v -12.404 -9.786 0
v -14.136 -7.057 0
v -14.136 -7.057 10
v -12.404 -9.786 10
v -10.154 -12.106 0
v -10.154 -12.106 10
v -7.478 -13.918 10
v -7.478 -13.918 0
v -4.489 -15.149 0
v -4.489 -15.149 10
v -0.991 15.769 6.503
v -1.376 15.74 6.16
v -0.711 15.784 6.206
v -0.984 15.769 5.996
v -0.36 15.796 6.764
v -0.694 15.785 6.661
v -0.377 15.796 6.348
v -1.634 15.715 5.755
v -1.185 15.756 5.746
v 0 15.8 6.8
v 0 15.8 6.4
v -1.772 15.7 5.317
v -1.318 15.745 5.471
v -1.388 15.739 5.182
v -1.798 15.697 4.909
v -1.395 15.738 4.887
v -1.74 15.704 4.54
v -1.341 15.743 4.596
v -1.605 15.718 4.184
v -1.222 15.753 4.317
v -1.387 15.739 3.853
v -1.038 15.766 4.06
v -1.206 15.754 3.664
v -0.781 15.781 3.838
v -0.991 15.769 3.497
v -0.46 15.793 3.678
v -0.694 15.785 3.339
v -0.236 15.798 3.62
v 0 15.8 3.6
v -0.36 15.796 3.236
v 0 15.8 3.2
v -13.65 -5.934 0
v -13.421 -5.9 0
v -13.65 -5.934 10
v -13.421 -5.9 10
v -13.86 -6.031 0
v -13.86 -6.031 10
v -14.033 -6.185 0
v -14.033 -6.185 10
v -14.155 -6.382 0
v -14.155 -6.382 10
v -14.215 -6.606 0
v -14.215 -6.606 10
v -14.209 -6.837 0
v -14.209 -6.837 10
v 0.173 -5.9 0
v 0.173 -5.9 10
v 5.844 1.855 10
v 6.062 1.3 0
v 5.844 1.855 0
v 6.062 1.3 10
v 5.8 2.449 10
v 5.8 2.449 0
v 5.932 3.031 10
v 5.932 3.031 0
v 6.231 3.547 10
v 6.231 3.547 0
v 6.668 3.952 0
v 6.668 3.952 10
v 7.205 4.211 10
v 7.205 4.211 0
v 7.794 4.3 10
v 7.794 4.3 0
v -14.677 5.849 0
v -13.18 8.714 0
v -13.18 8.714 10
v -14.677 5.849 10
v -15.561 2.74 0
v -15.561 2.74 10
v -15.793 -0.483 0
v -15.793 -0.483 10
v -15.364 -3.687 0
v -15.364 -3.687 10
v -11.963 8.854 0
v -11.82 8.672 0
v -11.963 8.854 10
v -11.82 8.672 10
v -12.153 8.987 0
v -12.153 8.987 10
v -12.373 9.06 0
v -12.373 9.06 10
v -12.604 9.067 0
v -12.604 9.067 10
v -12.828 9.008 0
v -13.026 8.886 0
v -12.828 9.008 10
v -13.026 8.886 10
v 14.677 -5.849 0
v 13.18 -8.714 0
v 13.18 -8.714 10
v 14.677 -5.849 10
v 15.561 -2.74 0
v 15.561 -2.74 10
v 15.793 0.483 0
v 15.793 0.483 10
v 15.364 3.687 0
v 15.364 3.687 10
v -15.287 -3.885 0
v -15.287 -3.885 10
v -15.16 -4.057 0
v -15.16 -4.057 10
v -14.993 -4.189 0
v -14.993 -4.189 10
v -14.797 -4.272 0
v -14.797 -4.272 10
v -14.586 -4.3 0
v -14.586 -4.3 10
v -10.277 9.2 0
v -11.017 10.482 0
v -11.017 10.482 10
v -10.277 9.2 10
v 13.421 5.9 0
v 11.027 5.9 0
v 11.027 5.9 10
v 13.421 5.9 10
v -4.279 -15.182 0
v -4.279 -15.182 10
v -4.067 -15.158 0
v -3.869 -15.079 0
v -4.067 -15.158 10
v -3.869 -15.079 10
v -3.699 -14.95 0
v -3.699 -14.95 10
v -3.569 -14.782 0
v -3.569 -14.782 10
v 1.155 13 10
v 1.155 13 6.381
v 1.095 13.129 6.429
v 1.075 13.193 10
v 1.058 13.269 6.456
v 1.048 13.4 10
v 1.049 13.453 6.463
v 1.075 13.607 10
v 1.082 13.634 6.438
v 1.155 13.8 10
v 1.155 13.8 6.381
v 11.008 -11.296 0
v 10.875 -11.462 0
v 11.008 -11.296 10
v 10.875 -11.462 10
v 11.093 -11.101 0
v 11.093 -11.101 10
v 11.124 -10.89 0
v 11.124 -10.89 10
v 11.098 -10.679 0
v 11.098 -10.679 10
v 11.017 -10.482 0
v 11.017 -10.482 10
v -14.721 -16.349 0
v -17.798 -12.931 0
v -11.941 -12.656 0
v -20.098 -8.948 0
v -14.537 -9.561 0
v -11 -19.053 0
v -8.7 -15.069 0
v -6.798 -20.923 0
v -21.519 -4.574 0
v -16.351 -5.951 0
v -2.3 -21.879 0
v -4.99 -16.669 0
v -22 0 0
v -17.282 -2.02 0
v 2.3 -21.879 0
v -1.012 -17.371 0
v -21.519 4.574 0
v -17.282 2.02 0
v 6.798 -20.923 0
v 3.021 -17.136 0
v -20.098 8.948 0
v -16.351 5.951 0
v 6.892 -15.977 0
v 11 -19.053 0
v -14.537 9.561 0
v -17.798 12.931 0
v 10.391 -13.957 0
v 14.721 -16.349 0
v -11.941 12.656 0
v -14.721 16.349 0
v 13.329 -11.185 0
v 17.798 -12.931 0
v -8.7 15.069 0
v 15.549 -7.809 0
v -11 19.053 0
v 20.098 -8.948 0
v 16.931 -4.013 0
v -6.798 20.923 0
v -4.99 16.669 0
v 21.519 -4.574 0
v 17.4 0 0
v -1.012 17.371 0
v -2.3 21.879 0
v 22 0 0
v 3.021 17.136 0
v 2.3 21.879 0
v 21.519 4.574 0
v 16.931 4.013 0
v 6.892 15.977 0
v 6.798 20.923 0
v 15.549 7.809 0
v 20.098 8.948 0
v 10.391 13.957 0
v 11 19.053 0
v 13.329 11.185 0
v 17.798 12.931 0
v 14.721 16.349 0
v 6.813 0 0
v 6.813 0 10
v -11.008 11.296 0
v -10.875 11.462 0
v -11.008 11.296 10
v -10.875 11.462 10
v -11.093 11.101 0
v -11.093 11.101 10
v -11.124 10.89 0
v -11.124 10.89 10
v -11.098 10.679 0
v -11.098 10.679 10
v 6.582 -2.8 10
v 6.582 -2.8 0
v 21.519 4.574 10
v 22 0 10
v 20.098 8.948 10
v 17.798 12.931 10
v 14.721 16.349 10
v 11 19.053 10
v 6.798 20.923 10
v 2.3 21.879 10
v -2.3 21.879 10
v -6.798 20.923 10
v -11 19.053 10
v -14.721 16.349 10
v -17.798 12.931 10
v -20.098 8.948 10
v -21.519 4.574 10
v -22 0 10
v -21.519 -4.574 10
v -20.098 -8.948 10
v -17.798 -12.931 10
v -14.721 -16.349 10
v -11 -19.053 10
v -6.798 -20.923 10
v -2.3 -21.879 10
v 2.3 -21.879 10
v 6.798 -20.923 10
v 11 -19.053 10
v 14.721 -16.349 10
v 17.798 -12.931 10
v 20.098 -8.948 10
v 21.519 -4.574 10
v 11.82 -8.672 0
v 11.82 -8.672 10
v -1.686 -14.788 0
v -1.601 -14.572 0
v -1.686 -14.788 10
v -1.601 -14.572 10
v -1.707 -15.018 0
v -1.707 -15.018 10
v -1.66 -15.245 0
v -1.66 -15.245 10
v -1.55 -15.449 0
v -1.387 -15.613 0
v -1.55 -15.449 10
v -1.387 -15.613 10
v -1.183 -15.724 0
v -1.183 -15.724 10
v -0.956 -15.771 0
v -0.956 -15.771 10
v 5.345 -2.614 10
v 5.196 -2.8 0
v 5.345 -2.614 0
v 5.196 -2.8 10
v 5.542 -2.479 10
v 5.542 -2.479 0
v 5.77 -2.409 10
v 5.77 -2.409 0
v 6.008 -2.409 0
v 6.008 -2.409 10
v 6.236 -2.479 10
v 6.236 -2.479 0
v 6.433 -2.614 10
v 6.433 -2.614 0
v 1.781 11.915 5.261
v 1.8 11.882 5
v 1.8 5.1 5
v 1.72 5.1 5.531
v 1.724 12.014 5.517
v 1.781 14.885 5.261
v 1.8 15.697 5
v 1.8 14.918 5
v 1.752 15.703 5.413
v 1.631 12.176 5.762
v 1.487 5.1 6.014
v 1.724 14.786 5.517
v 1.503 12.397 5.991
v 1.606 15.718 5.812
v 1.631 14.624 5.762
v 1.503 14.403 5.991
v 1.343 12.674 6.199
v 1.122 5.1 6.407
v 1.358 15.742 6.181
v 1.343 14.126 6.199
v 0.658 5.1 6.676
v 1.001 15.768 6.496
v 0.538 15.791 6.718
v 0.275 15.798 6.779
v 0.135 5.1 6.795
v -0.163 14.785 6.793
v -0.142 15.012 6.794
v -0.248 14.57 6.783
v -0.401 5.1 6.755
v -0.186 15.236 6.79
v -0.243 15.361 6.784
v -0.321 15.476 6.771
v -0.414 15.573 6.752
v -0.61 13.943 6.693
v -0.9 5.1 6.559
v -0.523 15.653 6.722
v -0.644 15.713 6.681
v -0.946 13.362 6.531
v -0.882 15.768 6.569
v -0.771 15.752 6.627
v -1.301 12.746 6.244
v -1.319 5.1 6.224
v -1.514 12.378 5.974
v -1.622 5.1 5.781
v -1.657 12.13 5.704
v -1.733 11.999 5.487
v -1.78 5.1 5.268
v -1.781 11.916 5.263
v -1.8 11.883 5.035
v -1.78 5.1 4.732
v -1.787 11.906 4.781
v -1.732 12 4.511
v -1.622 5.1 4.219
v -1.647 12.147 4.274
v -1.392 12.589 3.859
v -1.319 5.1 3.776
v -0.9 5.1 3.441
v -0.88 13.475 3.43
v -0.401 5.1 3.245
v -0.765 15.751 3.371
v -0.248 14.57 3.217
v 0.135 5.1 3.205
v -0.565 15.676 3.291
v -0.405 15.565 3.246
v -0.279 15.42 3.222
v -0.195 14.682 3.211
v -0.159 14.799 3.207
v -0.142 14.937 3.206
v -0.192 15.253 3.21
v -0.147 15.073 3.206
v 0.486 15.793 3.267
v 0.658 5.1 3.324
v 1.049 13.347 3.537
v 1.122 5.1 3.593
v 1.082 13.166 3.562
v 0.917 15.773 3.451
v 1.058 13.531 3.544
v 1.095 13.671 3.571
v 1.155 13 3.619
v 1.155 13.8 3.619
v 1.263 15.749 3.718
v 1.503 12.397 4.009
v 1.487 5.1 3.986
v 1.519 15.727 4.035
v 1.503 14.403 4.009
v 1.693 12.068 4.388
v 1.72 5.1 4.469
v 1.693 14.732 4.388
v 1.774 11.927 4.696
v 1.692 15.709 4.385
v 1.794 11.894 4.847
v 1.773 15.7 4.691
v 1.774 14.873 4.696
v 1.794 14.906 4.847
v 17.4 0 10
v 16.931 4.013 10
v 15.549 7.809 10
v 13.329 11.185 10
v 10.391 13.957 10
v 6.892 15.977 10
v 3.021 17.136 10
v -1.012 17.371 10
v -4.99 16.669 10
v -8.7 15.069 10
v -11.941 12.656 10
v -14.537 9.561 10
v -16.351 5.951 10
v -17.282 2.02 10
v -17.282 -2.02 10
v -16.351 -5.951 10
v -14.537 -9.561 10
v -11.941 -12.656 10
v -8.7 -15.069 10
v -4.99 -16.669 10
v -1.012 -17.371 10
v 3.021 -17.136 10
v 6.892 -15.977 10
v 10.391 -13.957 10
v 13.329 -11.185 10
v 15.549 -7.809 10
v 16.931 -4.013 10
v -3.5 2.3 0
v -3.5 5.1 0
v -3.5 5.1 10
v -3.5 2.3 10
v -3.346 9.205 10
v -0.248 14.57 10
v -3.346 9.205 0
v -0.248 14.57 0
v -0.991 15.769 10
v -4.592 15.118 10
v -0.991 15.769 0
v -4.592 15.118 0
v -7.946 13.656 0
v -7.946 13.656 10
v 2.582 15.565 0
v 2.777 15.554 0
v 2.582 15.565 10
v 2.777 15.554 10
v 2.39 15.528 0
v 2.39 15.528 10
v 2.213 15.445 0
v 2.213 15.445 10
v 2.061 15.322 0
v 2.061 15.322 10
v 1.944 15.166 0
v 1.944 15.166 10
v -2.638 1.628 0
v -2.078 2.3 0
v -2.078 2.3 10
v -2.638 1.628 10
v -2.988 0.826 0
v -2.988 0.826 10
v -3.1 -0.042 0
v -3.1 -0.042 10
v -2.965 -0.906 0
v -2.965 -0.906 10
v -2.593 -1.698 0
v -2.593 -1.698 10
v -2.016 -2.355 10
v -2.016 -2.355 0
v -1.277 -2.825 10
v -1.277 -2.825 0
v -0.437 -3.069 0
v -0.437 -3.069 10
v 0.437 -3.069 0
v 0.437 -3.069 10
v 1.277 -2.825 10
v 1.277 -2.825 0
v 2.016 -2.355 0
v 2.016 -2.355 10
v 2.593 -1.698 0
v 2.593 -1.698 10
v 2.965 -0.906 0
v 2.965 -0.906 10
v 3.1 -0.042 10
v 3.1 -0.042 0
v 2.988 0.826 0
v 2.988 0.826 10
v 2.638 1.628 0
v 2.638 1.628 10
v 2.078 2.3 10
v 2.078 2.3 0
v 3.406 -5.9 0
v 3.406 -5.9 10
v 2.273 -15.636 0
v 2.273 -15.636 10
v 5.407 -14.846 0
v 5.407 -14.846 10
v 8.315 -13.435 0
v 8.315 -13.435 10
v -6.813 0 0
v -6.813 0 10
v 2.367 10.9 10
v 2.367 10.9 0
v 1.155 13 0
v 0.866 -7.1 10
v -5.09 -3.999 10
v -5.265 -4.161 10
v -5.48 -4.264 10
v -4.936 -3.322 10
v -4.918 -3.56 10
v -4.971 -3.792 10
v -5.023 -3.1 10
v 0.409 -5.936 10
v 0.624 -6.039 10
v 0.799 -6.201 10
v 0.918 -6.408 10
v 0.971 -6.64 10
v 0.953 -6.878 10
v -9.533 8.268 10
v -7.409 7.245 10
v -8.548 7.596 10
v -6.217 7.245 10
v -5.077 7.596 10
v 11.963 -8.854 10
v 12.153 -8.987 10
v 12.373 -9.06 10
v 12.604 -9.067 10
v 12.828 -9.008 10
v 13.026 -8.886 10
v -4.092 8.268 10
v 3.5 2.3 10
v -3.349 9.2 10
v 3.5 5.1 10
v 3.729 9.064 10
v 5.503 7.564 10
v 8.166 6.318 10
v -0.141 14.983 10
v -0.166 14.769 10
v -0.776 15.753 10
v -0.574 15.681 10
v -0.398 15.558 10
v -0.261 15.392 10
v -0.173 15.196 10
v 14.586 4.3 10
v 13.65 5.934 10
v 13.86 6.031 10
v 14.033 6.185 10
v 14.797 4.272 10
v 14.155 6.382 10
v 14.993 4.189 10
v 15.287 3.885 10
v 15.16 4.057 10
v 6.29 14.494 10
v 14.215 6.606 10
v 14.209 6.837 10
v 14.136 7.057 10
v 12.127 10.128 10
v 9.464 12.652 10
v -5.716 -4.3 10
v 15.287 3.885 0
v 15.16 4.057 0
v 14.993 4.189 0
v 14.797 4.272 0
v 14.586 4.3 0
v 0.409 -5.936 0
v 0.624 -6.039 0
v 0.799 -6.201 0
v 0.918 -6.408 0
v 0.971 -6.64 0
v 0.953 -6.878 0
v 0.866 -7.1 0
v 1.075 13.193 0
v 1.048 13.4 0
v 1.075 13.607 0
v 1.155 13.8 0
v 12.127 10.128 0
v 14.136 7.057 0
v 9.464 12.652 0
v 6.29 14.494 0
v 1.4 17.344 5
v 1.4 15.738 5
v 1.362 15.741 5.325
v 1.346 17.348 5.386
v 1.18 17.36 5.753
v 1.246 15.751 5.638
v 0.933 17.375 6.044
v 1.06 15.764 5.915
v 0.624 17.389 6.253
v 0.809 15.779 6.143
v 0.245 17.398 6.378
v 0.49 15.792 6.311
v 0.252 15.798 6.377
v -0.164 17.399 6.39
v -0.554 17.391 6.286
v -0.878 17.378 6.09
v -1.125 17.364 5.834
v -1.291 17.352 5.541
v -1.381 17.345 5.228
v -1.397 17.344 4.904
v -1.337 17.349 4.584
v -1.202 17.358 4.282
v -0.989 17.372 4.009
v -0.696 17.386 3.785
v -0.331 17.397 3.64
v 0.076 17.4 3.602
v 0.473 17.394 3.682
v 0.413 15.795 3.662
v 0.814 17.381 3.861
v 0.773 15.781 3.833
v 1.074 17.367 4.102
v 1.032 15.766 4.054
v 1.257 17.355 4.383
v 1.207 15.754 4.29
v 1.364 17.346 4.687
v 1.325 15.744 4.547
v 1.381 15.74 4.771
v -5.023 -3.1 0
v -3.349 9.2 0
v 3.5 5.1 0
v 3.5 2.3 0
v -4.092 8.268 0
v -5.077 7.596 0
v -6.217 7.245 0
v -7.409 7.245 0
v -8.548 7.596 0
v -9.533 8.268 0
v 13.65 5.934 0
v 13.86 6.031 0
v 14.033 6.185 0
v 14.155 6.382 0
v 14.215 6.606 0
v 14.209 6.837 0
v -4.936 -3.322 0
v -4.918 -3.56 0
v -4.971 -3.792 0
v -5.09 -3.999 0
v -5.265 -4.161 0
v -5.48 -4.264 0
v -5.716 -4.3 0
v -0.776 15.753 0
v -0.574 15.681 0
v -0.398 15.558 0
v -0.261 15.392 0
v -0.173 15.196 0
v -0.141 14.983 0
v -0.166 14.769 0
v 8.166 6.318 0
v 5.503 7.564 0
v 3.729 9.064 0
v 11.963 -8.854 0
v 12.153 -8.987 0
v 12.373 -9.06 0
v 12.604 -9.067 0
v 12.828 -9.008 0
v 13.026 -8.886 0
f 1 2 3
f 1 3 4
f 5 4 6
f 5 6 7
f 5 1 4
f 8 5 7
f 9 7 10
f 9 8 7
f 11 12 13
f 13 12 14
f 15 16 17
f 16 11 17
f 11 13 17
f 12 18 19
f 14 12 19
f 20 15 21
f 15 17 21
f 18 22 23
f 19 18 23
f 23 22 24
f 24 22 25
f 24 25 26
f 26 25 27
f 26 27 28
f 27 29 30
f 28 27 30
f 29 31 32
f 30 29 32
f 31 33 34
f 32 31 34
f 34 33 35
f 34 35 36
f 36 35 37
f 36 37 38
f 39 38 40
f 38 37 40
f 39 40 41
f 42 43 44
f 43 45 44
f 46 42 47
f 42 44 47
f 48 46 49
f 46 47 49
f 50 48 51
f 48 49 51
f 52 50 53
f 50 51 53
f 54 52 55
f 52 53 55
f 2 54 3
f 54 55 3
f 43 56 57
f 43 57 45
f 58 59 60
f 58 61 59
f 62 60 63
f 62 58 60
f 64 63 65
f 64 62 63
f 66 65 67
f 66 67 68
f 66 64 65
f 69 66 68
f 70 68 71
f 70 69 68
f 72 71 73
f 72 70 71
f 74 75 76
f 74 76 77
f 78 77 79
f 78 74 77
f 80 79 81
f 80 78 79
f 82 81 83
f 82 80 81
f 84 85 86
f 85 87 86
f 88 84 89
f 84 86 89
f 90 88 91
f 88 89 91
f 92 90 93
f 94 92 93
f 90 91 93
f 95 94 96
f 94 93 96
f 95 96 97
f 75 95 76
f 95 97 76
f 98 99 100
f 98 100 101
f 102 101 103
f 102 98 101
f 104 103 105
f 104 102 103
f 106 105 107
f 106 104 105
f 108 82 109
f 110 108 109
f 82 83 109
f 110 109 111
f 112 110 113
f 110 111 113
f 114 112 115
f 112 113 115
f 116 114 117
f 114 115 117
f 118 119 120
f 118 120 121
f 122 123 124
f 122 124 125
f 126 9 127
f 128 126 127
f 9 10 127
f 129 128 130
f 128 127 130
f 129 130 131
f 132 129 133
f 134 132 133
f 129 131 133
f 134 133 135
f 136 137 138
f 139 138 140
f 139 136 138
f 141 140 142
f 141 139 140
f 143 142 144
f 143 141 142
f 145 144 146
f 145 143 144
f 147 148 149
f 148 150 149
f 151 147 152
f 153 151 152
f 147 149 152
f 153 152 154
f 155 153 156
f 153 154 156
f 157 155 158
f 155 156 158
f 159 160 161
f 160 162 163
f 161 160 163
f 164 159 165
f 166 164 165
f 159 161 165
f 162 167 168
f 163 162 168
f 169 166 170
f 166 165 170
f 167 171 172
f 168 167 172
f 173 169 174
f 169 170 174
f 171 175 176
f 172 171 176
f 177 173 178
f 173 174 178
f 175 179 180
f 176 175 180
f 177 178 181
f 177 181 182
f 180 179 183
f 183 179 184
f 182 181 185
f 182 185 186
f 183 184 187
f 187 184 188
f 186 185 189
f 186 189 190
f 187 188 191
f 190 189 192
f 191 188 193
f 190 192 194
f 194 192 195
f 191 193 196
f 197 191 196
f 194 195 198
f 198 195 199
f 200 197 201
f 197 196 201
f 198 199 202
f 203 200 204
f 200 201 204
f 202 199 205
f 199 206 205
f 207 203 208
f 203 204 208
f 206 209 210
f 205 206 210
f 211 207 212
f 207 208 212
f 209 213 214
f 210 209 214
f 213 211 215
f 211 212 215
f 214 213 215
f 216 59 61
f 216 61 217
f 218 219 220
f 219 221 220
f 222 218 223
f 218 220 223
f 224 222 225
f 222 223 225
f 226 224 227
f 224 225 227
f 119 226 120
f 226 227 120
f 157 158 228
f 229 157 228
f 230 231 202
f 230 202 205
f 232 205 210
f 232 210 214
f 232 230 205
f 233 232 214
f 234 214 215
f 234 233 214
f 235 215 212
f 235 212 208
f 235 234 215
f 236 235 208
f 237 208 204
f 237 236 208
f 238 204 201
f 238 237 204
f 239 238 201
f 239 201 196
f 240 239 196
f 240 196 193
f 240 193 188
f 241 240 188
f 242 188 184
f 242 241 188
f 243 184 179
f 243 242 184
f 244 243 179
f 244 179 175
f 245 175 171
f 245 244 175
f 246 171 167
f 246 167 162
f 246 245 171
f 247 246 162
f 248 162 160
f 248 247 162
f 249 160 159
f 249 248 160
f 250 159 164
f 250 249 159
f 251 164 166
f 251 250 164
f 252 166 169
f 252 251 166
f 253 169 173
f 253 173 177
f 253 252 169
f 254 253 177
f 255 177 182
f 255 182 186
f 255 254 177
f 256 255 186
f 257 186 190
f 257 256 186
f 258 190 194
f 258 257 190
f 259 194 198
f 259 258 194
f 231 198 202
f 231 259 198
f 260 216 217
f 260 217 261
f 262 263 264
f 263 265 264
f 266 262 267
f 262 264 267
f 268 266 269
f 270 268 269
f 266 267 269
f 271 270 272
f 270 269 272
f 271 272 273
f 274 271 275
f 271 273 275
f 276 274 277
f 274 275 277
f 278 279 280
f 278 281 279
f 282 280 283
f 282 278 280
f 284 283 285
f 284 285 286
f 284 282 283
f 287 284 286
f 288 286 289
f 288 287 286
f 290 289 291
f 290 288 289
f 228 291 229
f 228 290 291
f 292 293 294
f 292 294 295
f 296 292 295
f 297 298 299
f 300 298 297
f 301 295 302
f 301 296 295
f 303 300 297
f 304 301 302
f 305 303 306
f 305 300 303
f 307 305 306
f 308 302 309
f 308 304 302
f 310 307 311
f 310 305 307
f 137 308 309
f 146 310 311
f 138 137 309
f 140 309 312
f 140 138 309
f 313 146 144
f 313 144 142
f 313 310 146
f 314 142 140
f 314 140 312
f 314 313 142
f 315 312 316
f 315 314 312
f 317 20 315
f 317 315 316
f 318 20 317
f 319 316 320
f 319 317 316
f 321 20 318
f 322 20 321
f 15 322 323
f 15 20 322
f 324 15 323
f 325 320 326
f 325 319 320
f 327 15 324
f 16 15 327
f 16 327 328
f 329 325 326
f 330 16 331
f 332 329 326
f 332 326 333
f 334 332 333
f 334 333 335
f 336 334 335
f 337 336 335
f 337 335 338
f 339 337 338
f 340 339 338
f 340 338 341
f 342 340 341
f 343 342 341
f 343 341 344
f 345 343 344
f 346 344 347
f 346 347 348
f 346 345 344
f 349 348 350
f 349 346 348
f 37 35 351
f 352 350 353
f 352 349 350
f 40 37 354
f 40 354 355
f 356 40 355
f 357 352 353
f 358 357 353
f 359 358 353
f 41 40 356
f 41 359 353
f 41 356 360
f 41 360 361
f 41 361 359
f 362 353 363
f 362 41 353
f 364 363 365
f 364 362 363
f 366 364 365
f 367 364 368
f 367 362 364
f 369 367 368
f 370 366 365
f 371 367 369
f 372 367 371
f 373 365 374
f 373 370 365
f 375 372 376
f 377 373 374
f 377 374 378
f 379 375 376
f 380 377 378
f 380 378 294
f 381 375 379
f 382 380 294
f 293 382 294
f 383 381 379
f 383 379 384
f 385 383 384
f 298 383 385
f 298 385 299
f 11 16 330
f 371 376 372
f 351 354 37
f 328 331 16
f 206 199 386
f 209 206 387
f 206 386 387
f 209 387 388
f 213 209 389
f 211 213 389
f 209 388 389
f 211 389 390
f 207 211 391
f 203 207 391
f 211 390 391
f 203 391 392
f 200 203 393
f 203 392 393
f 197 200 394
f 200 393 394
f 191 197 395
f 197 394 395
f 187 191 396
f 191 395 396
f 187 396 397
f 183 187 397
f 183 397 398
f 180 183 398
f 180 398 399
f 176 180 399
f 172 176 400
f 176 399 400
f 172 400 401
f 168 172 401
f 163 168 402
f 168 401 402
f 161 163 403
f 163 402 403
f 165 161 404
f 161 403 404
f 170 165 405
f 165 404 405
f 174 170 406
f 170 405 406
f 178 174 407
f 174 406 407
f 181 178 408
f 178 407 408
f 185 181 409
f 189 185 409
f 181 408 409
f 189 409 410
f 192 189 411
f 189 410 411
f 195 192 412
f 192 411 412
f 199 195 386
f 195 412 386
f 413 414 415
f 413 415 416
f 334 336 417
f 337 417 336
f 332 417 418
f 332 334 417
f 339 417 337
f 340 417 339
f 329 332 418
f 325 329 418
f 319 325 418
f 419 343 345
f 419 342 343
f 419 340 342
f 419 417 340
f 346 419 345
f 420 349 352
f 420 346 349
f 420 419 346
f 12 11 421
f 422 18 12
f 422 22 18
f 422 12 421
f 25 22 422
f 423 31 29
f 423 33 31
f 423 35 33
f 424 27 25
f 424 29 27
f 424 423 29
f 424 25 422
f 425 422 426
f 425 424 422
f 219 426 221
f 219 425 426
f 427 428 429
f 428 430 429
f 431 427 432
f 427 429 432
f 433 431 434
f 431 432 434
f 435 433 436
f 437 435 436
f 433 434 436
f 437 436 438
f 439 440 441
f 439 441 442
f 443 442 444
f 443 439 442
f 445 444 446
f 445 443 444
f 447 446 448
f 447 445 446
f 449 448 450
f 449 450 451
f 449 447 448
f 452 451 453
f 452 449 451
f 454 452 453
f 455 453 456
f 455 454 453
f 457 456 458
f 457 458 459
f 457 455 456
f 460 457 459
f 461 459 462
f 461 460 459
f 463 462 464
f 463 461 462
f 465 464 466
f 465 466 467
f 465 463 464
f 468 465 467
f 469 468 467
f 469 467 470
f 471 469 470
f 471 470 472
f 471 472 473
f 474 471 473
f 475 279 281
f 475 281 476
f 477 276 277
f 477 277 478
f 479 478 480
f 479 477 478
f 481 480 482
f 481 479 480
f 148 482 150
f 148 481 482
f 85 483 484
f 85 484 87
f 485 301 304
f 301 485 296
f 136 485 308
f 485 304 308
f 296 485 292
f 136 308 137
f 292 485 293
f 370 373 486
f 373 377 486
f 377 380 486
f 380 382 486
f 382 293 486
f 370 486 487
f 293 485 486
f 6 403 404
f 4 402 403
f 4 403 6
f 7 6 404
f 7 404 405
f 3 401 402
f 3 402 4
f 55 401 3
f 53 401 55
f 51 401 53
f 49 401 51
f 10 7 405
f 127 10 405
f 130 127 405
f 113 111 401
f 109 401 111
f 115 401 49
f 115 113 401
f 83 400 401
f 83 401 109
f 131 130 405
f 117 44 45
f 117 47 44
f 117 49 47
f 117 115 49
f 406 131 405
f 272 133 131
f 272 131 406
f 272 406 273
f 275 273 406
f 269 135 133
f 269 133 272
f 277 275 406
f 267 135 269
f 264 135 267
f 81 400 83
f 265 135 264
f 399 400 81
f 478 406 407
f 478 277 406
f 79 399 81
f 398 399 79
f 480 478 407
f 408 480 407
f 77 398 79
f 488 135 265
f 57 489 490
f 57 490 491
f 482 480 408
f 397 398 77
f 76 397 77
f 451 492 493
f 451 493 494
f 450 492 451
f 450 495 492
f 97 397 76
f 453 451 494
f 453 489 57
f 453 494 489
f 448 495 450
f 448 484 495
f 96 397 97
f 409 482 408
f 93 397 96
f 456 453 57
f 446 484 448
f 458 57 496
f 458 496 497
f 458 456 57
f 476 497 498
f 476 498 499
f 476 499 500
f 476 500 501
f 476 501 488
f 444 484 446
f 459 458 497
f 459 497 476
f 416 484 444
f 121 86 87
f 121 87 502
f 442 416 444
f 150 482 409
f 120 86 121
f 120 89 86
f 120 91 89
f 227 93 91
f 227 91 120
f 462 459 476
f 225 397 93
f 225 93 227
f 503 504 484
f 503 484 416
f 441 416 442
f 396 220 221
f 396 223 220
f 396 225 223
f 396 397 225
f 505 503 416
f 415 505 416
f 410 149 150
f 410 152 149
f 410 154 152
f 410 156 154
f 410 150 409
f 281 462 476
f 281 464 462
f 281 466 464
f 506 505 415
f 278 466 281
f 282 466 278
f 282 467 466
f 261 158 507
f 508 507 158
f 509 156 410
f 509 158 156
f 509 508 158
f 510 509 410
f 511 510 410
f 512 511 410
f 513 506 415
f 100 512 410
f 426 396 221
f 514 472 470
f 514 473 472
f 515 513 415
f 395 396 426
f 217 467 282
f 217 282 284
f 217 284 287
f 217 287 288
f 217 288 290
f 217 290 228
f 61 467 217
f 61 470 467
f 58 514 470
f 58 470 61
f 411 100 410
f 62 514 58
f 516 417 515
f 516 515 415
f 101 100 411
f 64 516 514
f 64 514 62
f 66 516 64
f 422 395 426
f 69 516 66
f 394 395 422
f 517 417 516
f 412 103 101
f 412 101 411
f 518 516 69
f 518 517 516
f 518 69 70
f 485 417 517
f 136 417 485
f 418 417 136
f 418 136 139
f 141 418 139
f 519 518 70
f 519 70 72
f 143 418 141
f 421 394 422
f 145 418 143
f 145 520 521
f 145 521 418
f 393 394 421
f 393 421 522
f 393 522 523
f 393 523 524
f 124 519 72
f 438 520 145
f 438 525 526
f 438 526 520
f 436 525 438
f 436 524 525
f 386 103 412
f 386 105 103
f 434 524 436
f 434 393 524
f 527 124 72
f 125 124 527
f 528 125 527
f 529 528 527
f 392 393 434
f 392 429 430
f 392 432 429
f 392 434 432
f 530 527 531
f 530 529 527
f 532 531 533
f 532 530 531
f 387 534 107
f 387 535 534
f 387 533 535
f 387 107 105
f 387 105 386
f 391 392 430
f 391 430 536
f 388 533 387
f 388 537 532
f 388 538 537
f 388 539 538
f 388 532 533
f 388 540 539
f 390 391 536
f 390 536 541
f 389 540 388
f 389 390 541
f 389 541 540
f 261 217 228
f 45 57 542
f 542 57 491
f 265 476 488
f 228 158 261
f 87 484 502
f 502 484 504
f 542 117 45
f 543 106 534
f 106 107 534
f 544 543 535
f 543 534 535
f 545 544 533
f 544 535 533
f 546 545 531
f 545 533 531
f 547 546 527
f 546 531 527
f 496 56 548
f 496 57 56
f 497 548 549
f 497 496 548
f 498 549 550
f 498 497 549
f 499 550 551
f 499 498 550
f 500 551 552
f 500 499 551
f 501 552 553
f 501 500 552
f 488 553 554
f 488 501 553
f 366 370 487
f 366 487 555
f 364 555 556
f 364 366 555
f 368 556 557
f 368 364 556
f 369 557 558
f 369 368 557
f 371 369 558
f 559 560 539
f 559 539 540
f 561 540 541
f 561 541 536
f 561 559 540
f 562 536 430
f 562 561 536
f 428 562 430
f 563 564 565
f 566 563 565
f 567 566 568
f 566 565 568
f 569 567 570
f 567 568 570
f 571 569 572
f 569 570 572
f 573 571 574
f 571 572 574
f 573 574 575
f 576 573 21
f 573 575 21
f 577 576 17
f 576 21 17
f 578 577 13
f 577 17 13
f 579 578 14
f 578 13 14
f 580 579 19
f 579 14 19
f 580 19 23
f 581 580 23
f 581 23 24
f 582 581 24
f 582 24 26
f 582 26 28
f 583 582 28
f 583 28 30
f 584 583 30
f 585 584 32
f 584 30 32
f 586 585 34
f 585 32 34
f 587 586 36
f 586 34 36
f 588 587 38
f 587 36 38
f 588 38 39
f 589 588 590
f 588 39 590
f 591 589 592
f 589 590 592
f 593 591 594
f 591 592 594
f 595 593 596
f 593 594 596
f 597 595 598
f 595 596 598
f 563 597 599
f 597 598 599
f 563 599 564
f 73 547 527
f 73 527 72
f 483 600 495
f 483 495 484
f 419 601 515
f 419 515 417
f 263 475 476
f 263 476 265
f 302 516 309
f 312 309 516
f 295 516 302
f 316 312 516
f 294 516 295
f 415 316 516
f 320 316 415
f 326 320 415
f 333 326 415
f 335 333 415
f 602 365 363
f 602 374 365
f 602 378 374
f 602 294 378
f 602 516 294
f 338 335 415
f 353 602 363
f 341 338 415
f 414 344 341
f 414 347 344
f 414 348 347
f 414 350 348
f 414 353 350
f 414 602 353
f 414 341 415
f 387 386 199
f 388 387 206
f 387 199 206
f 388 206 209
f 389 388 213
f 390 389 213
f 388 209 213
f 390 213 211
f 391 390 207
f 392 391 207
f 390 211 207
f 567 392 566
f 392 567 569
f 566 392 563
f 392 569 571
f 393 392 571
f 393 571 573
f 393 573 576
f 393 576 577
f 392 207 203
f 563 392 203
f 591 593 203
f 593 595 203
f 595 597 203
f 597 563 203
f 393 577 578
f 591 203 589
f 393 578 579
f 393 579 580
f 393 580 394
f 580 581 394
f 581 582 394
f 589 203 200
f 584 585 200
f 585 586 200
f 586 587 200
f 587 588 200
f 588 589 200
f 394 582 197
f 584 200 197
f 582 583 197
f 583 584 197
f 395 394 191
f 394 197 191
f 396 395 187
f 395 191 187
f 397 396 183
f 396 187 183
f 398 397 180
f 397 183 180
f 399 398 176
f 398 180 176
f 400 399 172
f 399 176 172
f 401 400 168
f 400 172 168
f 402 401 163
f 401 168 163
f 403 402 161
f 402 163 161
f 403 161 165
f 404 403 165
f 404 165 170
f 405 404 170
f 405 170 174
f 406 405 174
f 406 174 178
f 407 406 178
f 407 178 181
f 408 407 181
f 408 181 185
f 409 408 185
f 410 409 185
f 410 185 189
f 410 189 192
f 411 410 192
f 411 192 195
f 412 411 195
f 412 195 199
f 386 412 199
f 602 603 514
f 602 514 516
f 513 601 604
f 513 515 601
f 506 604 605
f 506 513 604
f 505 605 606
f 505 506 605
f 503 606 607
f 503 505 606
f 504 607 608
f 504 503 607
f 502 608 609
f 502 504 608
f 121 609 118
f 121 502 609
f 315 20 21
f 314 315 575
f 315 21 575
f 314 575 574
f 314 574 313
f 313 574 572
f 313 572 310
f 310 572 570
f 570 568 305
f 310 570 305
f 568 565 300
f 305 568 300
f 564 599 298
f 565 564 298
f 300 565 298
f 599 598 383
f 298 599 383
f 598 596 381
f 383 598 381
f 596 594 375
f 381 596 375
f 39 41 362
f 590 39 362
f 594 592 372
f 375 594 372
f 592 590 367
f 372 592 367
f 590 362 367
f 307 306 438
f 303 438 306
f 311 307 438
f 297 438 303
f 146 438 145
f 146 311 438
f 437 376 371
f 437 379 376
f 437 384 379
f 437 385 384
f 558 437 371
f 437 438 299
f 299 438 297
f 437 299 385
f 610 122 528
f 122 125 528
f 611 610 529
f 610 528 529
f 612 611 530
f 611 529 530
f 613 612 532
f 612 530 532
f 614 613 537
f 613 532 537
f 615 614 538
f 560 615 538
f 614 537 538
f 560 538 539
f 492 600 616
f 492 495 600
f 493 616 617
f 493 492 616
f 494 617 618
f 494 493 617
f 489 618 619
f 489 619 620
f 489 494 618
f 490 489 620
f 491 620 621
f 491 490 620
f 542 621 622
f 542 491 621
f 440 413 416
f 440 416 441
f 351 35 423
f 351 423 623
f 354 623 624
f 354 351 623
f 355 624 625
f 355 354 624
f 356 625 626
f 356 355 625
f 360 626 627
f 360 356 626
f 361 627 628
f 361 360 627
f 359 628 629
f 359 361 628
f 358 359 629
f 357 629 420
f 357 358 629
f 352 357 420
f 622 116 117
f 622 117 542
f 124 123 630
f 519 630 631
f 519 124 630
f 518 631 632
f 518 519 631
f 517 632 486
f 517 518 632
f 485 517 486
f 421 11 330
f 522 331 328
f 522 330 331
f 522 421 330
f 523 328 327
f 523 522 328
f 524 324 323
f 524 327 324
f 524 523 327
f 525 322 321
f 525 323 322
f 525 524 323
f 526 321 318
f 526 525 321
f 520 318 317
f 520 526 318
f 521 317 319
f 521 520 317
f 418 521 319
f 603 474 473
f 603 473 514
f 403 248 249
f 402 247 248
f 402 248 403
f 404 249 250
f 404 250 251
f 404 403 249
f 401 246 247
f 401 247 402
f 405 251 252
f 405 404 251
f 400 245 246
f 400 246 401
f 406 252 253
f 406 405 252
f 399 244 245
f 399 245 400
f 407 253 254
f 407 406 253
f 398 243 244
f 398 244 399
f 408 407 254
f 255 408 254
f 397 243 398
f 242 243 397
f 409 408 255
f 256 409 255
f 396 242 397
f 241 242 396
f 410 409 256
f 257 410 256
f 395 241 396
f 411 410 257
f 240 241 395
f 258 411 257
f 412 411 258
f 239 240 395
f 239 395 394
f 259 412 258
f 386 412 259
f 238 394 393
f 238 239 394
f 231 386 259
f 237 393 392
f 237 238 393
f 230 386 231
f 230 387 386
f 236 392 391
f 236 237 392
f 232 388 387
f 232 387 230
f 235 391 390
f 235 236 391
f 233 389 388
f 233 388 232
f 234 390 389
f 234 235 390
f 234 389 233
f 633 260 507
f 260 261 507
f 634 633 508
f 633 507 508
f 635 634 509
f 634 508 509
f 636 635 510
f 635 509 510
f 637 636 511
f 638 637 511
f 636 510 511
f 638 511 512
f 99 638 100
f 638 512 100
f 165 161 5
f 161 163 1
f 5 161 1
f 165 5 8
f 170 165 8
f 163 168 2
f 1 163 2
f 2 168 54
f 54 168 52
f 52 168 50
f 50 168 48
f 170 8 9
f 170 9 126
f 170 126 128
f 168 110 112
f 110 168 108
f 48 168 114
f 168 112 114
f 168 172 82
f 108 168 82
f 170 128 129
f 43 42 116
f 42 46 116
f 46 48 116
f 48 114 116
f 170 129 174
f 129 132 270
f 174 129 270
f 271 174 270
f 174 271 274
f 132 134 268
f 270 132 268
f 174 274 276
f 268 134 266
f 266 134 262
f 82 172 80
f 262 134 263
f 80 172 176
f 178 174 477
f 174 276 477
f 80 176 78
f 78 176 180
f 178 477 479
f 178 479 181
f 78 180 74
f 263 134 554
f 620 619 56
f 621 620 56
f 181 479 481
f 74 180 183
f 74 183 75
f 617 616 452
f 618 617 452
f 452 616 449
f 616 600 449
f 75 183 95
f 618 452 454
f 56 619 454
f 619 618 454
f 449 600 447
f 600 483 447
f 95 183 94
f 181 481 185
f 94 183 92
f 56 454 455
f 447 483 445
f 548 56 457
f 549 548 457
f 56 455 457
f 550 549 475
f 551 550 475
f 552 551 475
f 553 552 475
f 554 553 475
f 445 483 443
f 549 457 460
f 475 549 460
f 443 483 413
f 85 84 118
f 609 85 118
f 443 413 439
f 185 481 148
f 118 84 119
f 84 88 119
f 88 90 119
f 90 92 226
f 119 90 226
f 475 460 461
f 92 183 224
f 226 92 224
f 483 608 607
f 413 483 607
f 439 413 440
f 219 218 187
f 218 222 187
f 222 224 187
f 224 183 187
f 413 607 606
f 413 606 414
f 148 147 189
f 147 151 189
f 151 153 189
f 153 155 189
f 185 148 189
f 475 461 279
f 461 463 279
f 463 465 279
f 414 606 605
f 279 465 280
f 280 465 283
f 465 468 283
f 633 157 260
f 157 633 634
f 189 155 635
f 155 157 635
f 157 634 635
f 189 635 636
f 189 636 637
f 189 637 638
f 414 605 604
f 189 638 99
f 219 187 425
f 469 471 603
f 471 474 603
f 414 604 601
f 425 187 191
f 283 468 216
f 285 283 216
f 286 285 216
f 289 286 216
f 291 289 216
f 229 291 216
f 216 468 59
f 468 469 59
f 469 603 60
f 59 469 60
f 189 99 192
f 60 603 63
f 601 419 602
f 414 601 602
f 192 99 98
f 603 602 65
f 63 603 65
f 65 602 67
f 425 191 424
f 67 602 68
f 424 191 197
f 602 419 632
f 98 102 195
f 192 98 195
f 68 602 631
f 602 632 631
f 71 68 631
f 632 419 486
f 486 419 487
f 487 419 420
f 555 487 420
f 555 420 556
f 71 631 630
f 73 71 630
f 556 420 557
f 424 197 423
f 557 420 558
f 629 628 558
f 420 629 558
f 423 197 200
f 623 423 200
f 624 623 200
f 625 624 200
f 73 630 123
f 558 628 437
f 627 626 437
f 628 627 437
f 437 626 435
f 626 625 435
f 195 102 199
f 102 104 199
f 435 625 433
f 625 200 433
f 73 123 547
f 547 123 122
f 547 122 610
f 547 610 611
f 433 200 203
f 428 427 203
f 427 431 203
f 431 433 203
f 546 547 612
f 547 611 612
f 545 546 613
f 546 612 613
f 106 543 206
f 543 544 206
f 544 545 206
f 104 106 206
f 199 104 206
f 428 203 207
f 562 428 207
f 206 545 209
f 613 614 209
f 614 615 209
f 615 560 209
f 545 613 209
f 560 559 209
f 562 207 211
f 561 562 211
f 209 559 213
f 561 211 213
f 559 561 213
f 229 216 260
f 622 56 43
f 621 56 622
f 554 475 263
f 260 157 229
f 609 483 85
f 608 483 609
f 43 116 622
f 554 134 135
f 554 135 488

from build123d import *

# Parameters (mm, degrees)
SKETCH1_R              = 17.4
BOSS_EXTRUDE1_DEPTH    = 10
BOSS_EXTRUDE3_DEPTH    = 10
FILLET1_R              = 0.8
FILLET2_R              = 0.8
FILLET3_R              = 0.8
CUT_EXTRUDE1_START     = -10.700000099
CUT_EXTRUDE1_OUTLINE_R = 1.8
CUT_EXTRUDE1_DEPTH     = 10.700000099
CUT_EXTRUDE1_START_2   = -1e-07
CUT_EXTRUDE1_2_DEPTH   = 10.0000002
SKETCH6_R              = 1.4
CUT_EXTRUDE3_DEPTH     = 31.149792736
SKETCH11_R             = 22
SKETCH11_R_2           = 17.4
BOSS_EXTRUDE7_DEPTH    = 10
FILLET4_R              = 10
FILLET5_R              = 4
FILLET6_R              = 2


with BuildPart() as part:
    # Sketch1 → Boss-Extrude1 (new body)
    with BuildSketch(Plane.XY):
        Circle(SKETCH1_R)
        with BuildLine():
            Line((2.078460969, 2.3), (3.5, 2.3))
            Line((3.5, 2.3), (3.5, 5.1))
            Line((3.5, 5.1), (-3.5, 5.1))
            Line((-3.5, 5.1), (-3.5, 2.3))
            Line((-3.5, 2.3), (-2.078460969, 2.3))
            ThreePointArc((-2.078460969, 2.3), (0, -3.1), (2.078460969, 2.3))
        make_face(mode=Mode.SUBTRACT)
        with BuildLine():
            Line((-6.812733176, 0), (-12.438089983, 9.743403799))
            ThreePointArc((-12.438089983, 9.743403799), (-15.502267656, 3.052817964), (-15.20361799, -4.3))
            Line((-15.20361799, -4.3), (-4.330127019, -4.3))
            Line((-4.330127019, -4.3), (-6.812733176, 0))
        make_face(mode=Mode.SUBTRACT)
        with BuildLine():
            Line((-3.406366588, -5.9), (-14.6570802, -5.9))
            ThreePointArc((-14.6570802, -5.9), (-10.394951738, -11.898948625), (-3.877899759, -15.316719409))
            Line((-3.877899759, -15.316719409), (1.558845727, -5.9))
            Line((1.558845727, -5.9), (-3.406366588, -5.9))
        make_face(mode=Mode.SUBTRACT)
        with BuildLine():
            Line((3.406366588, -5.9), (-2.218990218, -15.643403799))
            ThreePointArc((-2.218990218, -15.643403799), (5.107315918, -14.951766588), (11.325718232, -11.016719409))
            Line((11.325718232, -11.016719409), (5.888972746, -1.6))
            Line((5.888972746, -1.6), (3.406366588, -5.9))
        make_face(mode=Mode.SUBTRACT)
        with BuildLine():
            Line((6.812733176, 0), (12.438089983, -9.743403799))
            ThreePointArc((12.438089983, -9.743403799), (15.502267656, -3.052817964), (15.20361799, 4.3))
            Line((15.20361799, 4.3), (4.330127019, 4.3))
            Line((4.330127019, 4.3), (6.812733176, 0))
        make_face(mode=Mode.SUBTRACT)
        with BuildLine():
            Line((-11.325718232, 11.016719409), (-6.812733176, 3.2))
            Line((-6.812733176, 3.2), (-3.345858956, 9.204802293))
            Line((-3.345858956, 9.204802293), (0.458046128, 15.793359166))
            ThreePointArc((0.458046128, 15.793359166), (-5.935540926, 14.642723583), (-11.325718232, 11.016719409))
        make_face(mode=Mode.SUBTRACT)
        with BuildLine():
            Line((3.345858956, 9.204802293), (5.25388745, 5.9))
            Line((5.25388745, 5.9), (14.6570802, 5.9))
            ThreePointArc((14.6570802, 5.9), (9.743403799, 12.438089983), (2.218990218, 15.643403799))
            Line((2.218990218, 15.643403799), (-1.498338095, 9.204802293))
            Line((-1.498338095, 9.204802293), (3.345858956, 9.204802293))
        make_face(mode=Mode.SUBTRACT)
    extrude(amount=BOSS_EXTRUDE1_DEPTH)

    # Sketch9 → Boss-Extrude3 (add)
    with BuildSketch(Plane(origin=(0, 0, 0), x_dir=(-1, 0, 0), z_dir=(0, 0, -1))):
        Polygon((-3.345858956, 9.204802293), (-0.923760431, 13.4), (1.498338095, 9.204802293), align=None)
    extrude(amount=-BOSS_EXTRUDE3_DEPTH)

    # Fillet1
    fillet1_edges = [part.edges().sort_by_distance(p)[0] for p in [
        (0.923760431, 13.4, 5),
        (5.888972746, -1.6, 5),
        (-4.330127019, -4.3, 5),
        (1.558845727, -5.9, 5),
    ]]
    fillet(fillet1_edges, radius=FILLET1_R)

    # Fillet2
    fillet2_edges = [part.edges().sort_by_distance(p)[0] for p in [
        (-2.218990218, -15.643403799, 5),
        (12.438089983, -9.743403799, 5),
        (-12.438089983, 9.743403799, 5),
        (-14.6570802, -5.9, 5),
        (0.458046128, 15.793359166, 5),
        (14.6570802, 5.9, 5),
    ]]
    fillet(fillet2_edges, radius=FILLET2_R)

    # Fillet3
    fillet3_edges = [part.edges().sort_by_distance(p)[0] for p in [
        (11.325718232, -11.016719409, 5),
        (15.20361799, 4.3, 5),
        (-15.20361799, -4.3, 5),
        (-3.877899759, -15.316719409, 5),
        (-11.325718232, 11.016719409, 5),
        (2.218990218, 15.643403799, 5),
    ]]
    fillet(fillet3_edges, radius=FILLET3_R)

    # Cut-Extrude1: read off the stored shape, not the designer's step
    # Cut-Extrude1 outline → Cut-Extrude1 (cut)
    with BuildSketch(Plane.XZ.offset(-5.1).offset(CUT_EXTRUDE1_START)):
        with Locations((0, 5)):
            Circle(CUT_EXTRUDE1_OUTLINE_R)
    extrude(amount=CUT_EXTRUDE1_DEPTH, mode=Mode.SUBTRACT)

    # Cut-Extrude1 2 outline → Cut-Extrude1 2 (add)
    with BuildSketch(Plane.XY.offset(CUT_EXTRUDE1_START_2)):
        with BuildLine():
            Line((-3, 15.800000099), (-3, 15.512575543))
            ThreePointArc((-3, 15.512575543), (-1.506868675, 15.727979743), (0, 15.8))
            Line((0, 15.8), (-3, 15.800000099))
        make_face()
        with BuildLine():
            Line((3, 15.800000099), (0, 15.8))
            ThreePointArc((0, 15.8), (0.901468663, 15.774262399), (1.80000041, 15.697133449))
            Line((1.80000041, 15.697133449), (3, 15.559528723))
            Line((3, 15.559528723), (3, 15.800000099))
        make_face()
    extrude(amount=CUT_EXTRUDE1_2_DEPTH)

    # Sketch6 → Cut-Extrude3 (cut, through all)
    with BuildSketch(Plane.XZ.offset(-5.1)):
        with Locations((0, 5)):
            Circle(SKETCH6_R)
    extrude(amount=-CUT_EXTRUDE3_DEPTH, mode=Mode.SUBTRACT)

    # Fillet4
    fillet4_edges = [part.edges().sort_by_distance(p)[0] for p in [
        (5.25388745, 5.9, 5),
    ]]
    fillet(fillet4_edges, radius=FILLET4_R)

    # Fillet5
    fillet5_edges = [part.edges().sort_by_distance(p)[0] for p in [
        (-6.812733176, 3.2, 5),
    ]]
    fillet(fillet5_edges, radius=FILLET5_R)

    # Fillet6
    fillet6_edges = [part.edges().sort_by_distance(p)[0] for p in [
        (4.330127019, 4.3, 5),
    ]]
    fillet(fillet6_edges, radius=FILLET6_R)


with BuildPart() as body_2:
    # Sketch11 → Boss-Extrude7 (new body)
    with BuildSketch(Plane.XY.offset(10)):
        Circle(SKETCH11_R)
        Circle(SKETCH11_R_2, mode=Mode.SUBTRACT)
    extrude(amount=-BOSS_EXTRUDE7_DEPTH)


solid = Compound([part.part, body_2.part])
